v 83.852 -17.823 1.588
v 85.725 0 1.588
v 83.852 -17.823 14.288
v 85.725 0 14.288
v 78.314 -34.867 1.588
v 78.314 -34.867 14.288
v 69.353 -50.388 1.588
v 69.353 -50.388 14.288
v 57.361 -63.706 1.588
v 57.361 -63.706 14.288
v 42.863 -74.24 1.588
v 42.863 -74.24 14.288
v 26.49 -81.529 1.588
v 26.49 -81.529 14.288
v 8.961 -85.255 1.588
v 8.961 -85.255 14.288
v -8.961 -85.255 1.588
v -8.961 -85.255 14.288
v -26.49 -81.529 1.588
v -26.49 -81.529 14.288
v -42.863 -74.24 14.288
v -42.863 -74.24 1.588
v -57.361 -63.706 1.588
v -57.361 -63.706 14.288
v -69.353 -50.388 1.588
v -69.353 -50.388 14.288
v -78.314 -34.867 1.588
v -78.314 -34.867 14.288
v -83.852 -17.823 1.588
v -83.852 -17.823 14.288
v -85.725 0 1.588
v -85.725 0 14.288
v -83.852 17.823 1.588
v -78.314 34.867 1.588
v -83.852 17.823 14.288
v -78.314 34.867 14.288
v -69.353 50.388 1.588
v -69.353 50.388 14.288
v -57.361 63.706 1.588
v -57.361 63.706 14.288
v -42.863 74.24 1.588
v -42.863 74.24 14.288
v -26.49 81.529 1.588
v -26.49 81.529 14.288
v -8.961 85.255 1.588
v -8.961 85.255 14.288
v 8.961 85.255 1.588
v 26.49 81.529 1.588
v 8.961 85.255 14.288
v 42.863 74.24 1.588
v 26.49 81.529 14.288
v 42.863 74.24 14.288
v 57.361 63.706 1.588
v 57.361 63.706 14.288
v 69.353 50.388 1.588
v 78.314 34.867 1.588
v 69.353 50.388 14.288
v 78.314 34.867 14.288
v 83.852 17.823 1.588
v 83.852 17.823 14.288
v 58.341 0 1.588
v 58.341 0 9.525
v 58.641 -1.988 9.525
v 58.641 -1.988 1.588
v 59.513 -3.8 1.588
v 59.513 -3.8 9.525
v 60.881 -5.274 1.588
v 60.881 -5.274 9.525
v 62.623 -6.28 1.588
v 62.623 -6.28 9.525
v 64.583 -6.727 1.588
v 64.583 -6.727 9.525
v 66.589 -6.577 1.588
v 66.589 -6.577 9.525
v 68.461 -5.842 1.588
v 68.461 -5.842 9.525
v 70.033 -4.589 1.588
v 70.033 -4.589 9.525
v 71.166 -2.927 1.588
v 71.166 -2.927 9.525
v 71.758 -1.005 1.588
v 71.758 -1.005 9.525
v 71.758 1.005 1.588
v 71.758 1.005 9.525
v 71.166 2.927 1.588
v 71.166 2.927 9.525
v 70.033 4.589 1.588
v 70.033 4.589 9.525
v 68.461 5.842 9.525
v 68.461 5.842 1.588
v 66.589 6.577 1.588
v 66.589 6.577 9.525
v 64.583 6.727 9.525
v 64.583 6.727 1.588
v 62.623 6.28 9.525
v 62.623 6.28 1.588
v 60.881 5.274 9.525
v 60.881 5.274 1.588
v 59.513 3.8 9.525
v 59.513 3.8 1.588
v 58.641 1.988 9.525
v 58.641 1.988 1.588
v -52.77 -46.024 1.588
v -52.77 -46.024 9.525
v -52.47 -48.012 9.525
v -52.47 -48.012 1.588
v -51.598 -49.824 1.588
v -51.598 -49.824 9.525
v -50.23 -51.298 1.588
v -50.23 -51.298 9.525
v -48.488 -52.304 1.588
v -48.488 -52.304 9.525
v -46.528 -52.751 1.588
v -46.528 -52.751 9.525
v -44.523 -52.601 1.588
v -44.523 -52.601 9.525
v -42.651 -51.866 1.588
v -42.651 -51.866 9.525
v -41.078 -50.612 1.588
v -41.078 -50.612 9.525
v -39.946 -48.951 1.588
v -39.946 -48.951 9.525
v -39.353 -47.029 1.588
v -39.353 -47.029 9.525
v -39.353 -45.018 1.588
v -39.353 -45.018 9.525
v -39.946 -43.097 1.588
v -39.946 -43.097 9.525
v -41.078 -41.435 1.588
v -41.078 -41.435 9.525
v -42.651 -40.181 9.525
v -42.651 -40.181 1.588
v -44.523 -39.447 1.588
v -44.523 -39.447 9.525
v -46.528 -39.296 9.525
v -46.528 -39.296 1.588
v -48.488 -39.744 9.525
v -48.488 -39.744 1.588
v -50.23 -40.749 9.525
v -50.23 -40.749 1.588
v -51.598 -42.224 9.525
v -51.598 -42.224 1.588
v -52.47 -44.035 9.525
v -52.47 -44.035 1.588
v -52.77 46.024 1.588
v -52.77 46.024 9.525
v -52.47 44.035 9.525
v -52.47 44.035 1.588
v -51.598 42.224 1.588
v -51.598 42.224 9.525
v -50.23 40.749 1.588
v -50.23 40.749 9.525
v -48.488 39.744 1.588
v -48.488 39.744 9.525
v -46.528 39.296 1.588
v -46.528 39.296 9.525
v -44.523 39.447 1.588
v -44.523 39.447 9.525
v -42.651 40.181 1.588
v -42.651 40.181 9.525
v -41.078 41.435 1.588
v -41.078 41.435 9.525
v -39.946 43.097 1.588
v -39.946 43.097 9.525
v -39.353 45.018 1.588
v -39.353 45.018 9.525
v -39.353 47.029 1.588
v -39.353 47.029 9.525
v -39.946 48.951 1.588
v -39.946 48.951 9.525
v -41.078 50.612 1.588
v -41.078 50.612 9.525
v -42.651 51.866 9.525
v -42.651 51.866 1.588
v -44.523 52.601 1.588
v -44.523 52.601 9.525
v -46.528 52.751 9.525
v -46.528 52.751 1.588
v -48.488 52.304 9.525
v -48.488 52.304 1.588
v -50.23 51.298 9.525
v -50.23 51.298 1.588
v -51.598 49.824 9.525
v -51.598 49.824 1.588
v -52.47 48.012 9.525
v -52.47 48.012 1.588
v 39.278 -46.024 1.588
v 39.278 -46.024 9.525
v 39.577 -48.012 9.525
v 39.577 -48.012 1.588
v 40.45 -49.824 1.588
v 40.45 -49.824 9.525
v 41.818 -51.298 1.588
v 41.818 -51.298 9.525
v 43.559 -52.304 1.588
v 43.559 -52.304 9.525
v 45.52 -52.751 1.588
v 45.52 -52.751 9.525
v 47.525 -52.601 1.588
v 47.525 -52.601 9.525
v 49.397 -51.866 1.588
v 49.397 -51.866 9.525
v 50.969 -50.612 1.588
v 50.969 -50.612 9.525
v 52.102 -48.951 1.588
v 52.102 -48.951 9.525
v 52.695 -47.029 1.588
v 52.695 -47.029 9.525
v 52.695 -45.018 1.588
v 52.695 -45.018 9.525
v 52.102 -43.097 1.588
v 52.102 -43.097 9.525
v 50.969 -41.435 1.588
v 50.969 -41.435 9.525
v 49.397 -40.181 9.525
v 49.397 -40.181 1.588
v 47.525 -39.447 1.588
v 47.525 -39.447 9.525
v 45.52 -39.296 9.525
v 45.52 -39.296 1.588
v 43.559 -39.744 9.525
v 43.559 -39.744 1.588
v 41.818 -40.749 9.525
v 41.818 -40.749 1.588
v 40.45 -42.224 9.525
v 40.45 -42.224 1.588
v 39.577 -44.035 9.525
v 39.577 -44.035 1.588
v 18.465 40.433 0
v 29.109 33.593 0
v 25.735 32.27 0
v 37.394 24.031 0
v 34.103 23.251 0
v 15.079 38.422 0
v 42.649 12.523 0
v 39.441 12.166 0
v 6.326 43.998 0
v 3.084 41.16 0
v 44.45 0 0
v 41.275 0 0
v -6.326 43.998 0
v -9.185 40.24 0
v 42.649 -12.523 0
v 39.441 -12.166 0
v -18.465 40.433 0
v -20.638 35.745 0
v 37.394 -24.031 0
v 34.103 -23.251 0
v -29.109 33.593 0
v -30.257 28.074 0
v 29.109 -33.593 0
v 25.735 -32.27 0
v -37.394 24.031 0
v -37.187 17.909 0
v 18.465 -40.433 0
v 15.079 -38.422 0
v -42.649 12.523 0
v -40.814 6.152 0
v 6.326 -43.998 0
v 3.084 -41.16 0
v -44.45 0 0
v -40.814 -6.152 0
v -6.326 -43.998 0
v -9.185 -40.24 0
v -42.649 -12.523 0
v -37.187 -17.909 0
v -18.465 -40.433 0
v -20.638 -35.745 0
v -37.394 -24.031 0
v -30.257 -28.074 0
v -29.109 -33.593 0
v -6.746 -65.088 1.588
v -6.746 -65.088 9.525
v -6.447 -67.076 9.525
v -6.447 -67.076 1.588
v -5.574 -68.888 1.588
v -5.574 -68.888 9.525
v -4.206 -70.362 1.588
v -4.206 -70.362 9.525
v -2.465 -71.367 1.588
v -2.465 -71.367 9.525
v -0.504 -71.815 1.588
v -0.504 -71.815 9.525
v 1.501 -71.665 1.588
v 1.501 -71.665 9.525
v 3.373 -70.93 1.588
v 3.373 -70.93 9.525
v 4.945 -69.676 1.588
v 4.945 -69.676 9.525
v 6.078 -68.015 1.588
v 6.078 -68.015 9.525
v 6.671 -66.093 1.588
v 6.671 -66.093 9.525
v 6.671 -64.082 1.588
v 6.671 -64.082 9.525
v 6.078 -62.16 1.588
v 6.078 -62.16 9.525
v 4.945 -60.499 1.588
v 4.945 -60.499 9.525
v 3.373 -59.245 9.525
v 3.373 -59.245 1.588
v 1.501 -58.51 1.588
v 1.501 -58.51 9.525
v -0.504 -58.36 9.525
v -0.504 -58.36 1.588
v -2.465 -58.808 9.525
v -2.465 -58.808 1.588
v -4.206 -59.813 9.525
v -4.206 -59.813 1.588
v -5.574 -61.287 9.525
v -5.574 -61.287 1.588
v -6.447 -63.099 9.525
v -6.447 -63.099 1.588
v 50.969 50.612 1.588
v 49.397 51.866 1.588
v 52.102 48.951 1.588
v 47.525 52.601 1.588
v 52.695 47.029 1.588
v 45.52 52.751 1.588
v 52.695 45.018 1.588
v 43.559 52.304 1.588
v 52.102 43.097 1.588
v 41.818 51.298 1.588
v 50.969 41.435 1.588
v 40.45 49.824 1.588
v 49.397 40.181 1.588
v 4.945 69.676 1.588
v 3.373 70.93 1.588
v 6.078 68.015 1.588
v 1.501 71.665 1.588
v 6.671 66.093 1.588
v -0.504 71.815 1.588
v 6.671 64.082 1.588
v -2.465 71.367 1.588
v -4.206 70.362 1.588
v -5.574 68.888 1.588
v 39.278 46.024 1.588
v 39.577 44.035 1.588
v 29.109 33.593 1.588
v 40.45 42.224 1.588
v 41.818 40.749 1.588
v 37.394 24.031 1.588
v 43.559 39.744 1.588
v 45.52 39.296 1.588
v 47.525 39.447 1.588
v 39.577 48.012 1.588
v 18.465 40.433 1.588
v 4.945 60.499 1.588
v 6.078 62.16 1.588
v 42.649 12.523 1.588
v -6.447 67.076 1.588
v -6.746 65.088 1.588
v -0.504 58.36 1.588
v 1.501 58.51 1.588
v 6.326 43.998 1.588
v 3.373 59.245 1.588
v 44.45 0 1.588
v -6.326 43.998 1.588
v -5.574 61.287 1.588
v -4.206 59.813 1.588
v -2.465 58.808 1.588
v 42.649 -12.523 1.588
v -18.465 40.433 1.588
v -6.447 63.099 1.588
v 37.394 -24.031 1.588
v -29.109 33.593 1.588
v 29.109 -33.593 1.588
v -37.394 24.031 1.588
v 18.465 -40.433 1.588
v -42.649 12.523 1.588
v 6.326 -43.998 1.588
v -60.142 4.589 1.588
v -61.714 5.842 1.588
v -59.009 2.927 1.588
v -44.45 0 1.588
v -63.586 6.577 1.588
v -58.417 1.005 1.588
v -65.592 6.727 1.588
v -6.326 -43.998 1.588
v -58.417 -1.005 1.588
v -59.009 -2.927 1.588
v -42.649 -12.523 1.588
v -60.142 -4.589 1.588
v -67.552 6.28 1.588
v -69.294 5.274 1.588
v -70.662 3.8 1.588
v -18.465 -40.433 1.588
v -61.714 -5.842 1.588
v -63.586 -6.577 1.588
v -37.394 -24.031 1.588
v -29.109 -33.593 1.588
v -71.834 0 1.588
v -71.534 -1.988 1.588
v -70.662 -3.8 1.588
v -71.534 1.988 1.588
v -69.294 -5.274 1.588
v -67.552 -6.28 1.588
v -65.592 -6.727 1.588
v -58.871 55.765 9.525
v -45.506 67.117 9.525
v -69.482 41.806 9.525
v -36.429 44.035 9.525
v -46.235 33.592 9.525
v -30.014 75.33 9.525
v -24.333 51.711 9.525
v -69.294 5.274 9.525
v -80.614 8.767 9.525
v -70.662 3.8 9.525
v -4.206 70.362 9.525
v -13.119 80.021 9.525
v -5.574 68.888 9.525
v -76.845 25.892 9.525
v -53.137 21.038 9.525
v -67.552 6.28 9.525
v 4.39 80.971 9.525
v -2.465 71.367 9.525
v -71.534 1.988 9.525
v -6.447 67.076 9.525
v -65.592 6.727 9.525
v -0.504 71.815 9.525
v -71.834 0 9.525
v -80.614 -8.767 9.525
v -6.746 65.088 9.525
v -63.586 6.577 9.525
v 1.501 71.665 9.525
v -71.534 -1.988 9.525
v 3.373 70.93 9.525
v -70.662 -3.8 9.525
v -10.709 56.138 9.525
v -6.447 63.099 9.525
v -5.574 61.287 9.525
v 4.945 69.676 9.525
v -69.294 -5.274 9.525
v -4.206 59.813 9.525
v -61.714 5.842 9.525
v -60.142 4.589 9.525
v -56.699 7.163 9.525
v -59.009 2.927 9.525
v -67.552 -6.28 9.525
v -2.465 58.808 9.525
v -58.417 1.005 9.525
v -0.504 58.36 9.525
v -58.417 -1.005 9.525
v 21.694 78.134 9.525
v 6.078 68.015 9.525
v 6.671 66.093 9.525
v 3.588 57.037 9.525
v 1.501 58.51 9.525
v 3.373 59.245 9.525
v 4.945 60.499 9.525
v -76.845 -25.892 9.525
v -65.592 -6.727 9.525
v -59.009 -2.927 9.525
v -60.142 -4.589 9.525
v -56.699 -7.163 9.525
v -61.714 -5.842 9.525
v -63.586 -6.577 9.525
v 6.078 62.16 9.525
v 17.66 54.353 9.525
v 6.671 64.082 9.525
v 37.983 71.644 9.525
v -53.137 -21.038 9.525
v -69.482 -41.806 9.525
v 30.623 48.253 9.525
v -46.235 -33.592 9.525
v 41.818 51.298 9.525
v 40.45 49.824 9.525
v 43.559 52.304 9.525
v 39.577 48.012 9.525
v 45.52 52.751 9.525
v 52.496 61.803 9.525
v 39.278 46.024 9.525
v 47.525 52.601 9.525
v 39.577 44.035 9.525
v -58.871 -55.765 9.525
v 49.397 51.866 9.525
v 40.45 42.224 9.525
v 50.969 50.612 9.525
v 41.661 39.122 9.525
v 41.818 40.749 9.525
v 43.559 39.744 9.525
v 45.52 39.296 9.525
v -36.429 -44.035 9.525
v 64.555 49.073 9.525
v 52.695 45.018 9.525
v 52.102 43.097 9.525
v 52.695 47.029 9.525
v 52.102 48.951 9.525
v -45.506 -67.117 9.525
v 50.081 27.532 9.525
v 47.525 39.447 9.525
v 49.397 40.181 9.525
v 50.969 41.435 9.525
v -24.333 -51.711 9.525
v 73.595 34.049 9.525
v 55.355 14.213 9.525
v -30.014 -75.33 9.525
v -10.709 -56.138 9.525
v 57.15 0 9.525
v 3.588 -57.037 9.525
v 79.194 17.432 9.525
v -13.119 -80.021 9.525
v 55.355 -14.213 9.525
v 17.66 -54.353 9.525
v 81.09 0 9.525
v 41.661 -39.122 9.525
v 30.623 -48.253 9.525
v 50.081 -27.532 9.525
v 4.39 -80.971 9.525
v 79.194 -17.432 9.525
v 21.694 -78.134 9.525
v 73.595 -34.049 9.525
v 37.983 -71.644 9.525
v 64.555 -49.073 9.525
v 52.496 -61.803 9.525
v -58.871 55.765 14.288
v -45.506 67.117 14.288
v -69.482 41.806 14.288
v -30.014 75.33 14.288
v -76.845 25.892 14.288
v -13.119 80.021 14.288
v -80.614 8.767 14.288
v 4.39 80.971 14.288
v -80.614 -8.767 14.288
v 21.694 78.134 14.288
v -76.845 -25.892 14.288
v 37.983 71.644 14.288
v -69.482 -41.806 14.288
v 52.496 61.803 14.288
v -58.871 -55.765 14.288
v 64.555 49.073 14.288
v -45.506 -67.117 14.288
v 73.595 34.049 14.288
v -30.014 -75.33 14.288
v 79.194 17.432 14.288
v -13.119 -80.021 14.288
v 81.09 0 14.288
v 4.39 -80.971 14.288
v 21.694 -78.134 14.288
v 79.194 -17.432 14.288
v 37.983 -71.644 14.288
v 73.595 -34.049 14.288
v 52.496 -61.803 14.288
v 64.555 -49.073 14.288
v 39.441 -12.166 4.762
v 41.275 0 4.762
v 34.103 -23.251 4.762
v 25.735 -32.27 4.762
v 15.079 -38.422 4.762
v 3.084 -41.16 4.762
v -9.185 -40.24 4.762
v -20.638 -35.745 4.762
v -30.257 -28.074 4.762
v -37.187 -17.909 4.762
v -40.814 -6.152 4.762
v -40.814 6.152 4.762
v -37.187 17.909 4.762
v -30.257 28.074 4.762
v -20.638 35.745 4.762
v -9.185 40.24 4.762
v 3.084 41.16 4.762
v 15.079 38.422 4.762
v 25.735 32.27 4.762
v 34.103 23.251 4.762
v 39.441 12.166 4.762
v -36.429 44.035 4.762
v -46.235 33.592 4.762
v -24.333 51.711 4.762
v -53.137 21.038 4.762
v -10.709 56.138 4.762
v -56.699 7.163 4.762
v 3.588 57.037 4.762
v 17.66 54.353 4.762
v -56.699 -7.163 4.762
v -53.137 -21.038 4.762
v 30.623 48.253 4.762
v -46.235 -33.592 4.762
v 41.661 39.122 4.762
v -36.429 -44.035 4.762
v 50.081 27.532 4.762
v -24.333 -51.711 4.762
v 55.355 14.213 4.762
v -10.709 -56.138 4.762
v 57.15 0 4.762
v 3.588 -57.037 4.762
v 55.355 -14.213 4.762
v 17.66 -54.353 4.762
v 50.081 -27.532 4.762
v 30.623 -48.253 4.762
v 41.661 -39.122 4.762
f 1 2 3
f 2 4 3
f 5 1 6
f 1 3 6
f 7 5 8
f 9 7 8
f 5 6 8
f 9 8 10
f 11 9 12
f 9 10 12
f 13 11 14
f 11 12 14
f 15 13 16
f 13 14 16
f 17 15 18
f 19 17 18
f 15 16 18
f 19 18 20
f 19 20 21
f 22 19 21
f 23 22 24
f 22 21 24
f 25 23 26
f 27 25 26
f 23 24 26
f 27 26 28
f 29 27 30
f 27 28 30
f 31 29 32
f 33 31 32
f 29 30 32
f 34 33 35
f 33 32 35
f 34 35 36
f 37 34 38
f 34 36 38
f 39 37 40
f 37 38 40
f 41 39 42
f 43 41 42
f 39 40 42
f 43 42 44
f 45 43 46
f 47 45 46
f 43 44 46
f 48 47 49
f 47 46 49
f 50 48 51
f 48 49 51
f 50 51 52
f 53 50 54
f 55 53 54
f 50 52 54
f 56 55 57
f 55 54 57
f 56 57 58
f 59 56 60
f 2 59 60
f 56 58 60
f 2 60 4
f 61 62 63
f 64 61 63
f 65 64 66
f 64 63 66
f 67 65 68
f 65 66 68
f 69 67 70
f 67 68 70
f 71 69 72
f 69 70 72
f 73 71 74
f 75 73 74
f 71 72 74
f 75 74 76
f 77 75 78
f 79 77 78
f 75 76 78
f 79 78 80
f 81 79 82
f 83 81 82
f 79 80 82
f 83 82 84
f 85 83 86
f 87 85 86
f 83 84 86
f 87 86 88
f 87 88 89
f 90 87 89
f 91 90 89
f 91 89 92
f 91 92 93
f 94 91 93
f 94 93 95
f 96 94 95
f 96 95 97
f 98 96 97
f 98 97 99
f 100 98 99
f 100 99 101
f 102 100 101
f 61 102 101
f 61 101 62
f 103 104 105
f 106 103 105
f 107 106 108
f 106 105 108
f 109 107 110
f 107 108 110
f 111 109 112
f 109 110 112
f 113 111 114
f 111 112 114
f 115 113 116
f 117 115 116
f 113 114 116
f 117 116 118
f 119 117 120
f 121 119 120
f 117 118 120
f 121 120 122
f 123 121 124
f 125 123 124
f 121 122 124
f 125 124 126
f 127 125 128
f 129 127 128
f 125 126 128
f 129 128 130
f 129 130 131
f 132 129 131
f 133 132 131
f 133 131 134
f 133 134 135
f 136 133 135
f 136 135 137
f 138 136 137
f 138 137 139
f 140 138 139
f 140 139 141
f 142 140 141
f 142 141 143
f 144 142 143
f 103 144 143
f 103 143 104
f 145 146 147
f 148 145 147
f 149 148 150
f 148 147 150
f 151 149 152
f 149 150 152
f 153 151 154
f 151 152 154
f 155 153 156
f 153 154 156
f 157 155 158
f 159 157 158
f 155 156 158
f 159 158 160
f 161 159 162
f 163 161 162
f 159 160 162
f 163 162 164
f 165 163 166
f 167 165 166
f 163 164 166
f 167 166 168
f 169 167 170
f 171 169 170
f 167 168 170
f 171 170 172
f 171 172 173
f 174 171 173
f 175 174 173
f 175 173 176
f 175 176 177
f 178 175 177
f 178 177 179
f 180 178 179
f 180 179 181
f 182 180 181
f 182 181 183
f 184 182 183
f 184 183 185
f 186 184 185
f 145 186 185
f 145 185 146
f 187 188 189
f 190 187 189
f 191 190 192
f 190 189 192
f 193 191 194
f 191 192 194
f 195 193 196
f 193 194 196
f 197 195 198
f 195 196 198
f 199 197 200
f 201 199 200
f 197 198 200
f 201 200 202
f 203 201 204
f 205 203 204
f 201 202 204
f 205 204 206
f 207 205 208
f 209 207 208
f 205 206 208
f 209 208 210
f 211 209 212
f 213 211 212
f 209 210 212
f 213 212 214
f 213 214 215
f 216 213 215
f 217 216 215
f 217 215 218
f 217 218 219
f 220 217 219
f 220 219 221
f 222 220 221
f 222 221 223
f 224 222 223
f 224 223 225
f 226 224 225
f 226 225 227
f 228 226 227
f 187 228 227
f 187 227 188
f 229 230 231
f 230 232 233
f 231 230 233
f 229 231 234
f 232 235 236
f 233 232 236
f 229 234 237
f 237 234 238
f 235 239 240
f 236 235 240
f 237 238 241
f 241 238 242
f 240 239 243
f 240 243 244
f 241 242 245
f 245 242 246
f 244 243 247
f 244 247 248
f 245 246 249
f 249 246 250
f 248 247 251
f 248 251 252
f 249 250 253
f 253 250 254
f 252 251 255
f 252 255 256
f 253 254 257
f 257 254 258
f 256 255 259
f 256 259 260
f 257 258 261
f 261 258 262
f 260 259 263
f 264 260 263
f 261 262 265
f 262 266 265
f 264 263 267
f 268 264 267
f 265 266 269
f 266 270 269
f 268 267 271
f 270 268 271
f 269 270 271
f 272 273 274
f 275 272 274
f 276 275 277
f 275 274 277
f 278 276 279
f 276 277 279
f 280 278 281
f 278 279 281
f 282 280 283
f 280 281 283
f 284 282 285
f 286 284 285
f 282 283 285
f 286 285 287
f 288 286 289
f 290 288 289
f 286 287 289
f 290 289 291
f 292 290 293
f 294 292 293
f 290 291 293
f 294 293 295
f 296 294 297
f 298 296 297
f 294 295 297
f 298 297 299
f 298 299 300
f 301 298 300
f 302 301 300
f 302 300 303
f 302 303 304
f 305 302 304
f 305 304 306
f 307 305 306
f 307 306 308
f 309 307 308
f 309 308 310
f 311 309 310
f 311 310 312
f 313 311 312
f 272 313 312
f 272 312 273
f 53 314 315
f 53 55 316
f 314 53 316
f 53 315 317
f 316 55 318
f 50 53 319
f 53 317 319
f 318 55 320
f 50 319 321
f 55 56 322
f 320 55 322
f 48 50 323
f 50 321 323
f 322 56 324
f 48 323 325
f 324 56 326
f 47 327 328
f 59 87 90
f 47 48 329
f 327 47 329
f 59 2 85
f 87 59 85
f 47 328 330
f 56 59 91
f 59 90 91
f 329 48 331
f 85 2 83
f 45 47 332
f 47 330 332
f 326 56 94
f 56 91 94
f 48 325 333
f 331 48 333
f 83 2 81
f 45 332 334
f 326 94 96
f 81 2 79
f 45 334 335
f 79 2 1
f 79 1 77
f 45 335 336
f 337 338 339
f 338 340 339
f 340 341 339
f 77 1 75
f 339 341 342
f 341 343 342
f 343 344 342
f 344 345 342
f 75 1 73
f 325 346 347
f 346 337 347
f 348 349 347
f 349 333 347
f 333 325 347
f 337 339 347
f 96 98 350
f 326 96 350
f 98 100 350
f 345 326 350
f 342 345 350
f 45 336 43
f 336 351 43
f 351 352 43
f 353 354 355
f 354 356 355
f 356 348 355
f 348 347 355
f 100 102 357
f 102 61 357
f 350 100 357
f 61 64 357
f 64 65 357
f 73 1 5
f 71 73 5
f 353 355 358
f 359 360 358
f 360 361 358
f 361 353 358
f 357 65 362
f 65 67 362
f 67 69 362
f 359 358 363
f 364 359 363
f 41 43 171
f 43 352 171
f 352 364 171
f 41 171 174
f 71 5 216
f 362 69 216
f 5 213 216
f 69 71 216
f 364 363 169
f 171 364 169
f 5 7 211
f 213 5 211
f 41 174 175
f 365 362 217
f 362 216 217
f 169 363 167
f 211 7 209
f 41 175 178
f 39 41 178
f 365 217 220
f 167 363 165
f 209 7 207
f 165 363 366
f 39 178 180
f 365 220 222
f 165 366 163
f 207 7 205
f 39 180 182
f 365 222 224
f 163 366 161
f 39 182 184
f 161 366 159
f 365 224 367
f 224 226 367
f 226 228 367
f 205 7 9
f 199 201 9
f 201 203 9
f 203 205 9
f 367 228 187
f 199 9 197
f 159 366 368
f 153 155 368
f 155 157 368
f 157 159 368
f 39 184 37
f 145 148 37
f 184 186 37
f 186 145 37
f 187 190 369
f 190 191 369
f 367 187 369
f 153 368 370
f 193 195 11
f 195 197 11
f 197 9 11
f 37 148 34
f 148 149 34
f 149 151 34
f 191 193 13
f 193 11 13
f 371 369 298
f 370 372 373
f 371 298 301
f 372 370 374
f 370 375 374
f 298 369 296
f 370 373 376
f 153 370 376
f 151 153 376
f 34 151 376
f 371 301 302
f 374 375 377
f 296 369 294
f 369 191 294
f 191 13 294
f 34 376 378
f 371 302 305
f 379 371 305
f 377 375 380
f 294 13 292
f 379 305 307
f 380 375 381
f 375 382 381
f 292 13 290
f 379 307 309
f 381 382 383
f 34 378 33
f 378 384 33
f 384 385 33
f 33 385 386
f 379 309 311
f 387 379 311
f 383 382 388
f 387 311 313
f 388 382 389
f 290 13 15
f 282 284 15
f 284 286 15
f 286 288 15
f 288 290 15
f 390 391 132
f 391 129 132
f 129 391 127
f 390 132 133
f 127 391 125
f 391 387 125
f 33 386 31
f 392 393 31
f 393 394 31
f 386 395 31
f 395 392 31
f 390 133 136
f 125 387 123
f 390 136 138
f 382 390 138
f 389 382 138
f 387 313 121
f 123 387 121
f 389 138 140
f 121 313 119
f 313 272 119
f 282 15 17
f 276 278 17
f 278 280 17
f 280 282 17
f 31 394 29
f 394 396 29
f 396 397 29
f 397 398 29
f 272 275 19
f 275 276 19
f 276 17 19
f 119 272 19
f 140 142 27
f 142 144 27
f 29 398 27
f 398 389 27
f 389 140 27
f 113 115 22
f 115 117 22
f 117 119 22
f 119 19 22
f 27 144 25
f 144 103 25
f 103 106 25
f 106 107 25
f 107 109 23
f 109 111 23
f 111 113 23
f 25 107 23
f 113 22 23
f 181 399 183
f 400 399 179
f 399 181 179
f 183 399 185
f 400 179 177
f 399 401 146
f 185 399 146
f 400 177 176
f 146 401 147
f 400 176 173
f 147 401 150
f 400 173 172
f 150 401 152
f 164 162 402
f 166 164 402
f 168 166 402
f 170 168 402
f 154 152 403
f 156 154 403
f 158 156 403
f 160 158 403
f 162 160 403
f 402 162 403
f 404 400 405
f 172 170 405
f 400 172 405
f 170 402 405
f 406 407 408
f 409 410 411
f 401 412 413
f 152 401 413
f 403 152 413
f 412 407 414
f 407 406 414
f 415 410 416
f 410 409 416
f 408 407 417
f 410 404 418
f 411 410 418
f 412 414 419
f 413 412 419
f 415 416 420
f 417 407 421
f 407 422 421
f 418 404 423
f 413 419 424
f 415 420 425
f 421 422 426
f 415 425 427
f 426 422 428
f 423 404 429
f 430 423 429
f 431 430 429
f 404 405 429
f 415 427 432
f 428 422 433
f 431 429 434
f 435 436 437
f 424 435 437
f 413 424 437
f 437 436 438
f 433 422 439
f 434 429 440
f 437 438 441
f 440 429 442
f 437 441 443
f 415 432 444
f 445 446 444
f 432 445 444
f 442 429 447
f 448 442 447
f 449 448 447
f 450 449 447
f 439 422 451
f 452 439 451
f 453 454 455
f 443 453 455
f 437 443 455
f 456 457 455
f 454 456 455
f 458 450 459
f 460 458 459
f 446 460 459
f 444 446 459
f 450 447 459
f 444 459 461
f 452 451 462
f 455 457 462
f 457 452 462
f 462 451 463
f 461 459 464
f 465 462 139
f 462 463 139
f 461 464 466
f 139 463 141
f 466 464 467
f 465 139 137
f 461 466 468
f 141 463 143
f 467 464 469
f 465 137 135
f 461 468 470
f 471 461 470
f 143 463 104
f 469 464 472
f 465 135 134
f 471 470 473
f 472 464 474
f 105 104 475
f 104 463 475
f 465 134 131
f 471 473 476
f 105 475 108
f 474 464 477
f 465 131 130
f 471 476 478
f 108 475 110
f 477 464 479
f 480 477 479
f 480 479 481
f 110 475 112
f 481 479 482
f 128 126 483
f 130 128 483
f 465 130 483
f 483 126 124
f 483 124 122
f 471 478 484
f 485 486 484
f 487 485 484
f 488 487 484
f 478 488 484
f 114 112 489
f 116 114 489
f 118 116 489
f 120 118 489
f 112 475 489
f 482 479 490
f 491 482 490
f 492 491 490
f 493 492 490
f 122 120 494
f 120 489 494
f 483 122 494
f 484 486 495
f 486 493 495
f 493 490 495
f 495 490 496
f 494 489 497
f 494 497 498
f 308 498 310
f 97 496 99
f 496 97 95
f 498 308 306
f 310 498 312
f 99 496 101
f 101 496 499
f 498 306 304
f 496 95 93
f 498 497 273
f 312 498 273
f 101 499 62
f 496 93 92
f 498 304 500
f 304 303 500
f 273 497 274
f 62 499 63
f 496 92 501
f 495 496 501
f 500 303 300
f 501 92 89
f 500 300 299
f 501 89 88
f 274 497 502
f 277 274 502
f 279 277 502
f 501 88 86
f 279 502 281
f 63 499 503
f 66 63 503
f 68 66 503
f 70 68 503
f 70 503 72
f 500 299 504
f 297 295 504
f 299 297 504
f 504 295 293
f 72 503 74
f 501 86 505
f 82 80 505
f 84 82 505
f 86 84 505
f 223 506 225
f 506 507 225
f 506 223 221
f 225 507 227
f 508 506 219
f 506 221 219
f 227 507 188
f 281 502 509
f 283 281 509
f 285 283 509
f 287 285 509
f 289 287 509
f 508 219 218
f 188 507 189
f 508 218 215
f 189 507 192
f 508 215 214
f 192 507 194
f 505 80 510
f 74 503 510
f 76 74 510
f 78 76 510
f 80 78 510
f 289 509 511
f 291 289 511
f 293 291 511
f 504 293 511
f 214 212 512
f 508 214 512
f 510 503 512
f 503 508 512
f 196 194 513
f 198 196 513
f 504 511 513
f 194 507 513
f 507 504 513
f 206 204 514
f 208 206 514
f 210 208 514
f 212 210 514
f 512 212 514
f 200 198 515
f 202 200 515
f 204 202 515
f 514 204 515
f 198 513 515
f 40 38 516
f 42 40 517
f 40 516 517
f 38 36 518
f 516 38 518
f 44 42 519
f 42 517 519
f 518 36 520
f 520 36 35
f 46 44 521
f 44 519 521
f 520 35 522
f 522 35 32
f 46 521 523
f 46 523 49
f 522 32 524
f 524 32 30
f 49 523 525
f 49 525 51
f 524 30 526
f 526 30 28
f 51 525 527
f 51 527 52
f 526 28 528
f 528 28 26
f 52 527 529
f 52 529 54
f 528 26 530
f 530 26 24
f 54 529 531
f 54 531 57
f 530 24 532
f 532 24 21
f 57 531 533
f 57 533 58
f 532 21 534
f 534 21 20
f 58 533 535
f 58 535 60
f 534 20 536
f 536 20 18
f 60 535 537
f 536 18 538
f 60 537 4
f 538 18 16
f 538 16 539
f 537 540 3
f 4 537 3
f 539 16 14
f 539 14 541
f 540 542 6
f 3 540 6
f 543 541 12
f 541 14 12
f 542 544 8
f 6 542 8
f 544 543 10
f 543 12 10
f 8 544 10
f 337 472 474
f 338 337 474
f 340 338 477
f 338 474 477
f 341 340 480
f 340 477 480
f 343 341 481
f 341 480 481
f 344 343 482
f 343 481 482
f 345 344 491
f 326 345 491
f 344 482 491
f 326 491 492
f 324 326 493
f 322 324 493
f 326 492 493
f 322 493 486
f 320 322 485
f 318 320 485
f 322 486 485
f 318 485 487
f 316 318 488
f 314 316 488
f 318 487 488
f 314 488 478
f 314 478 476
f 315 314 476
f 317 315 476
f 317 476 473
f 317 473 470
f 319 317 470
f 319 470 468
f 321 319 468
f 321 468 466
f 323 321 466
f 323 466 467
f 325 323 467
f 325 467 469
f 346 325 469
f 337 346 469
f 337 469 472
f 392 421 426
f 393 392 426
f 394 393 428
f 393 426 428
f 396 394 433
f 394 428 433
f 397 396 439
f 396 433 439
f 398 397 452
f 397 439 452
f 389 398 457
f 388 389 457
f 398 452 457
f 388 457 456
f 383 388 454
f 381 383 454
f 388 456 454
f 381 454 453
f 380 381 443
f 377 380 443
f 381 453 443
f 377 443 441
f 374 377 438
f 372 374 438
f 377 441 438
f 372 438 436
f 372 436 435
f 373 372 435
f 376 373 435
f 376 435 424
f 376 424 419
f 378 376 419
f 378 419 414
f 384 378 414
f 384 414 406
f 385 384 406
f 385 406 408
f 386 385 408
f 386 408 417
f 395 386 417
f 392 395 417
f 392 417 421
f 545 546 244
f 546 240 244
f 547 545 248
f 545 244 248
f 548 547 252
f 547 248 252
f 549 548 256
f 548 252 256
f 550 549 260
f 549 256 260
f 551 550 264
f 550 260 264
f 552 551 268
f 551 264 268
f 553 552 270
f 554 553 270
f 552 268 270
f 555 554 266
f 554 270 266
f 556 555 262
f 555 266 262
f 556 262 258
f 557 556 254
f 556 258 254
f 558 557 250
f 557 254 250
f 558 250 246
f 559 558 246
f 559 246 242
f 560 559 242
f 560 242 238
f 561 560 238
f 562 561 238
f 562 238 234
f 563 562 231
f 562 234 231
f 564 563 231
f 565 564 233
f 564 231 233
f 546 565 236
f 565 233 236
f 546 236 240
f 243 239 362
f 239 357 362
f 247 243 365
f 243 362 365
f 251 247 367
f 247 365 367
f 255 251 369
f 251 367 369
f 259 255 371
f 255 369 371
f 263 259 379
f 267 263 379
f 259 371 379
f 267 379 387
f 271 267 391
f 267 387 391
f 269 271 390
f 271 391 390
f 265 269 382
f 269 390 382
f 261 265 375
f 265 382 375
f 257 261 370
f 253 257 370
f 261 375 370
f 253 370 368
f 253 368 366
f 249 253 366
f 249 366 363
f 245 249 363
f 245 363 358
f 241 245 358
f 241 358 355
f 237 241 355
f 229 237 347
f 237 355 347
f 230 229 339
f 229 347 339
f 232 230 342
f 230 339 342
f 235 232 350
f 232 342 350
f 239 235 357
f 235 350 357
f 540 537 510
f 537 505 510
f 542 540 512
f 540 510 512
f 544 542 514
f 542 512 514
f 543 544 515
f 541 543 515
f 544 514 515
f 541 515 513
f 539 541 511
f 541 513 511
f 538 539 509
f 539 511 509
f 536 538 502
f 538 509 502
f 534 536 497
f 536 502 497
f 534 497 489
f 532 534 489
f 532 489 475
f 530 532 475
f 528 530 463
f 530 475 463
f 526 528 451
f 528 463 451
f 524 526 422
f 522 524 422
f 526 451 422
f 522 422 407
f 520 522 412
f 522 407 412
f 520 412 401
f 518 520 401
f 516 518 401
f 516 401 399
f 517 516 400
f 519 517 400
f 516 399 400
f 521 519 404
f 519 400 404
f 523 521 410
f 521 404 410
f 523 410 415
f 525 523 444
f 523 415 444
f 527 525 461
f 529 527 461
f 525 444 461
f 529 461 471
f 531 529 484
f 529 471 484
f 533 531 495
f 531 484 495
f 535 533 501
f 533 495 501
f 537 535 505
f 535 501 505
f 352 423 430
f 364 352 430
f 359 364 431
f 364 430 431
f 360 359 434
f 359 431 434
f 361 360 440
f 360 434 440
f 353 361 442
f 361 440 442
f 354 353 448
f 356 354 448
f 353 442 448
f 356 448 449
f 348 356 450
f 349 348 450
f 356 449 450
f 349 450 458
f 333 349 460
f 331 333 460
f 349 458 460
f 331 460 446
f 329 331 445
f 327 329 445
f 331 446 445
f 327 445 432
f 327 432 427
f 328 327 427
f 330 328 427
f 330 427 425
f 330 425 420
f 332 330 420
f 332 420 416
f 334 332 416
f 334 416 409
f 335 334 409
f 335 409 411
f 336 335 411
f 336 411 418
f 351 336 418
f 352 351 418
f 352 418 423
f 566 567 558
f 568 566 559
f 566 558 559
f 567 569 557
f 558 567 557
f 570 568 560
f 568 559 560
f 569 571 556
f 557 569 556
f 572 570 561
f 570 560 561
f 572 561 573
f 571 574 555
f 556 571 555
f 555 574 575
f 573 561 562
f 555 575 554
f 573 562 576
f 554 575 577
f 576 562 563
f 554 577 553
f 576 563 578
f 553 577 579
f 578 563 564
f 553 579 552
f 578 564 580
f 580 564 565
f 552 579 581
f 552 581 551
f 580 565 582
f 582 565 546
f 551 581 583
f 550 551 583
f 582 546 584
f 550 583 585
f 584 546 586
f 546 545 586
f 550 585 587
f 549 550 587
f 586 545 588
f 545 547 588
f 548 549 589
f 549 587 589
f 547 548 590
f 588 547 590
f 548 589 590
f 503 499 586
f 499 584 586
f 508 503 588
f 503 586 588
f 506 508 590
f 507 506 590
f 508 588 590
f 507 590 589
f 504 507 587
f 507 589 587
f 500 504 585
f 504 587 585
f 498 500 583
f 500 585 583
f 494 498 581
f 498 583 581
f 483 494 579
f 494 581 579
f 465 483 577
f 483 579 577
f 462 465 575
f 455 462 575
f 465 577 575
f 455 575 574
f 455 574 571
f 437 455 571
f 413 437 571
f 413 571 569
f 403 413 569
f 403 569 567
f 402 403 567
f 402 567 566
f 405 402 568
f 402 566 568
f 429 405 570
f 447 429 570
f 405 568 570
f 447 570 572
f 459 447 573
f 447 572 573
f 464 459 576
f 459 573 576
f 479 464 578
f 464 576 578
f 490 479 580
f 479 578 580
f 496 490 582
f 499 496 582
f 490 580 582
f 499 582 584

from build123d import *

# Parameters (mm, degrees)
F3_D = 13.49248


with BuildPart() as f1:
    # F0 (on Front) → F1 (revolve)
    with BuildSketch(Plane.XZ):
        Polygon((41.275, 0), (44.45, 0), (44.45, 1.5875), (85.725, 1.5875), (85.725, 9.525), (85.725, 14.2875), (81.0895, 14.2875), (81.0895, 9.525), (57.15, 9.525), (57.15, 4.7625), (41.275, 4.7625), align=None)
    revolve(axis=Axis((0, 0, 11.4762624726), (0, 0, -1)))

    # F3 (through all)
    with Locations(Plane(origin=(0, 0, 1.5875), x_dir=(1, 0, 0), z_dir=(0, 0, -1))):
        with Locations((0, 65.0875), (-46.0238126205, 46.0238126205), (-65.0875, 0), (-46.0238126205, -46.0238126205), (0, -65.0875), (46.0238126205, -46.0238126205), (65.0875, 0), (46.0238126205, 46.0238126205)):
            Hole(F3_D / 2)


solid = f1.part
